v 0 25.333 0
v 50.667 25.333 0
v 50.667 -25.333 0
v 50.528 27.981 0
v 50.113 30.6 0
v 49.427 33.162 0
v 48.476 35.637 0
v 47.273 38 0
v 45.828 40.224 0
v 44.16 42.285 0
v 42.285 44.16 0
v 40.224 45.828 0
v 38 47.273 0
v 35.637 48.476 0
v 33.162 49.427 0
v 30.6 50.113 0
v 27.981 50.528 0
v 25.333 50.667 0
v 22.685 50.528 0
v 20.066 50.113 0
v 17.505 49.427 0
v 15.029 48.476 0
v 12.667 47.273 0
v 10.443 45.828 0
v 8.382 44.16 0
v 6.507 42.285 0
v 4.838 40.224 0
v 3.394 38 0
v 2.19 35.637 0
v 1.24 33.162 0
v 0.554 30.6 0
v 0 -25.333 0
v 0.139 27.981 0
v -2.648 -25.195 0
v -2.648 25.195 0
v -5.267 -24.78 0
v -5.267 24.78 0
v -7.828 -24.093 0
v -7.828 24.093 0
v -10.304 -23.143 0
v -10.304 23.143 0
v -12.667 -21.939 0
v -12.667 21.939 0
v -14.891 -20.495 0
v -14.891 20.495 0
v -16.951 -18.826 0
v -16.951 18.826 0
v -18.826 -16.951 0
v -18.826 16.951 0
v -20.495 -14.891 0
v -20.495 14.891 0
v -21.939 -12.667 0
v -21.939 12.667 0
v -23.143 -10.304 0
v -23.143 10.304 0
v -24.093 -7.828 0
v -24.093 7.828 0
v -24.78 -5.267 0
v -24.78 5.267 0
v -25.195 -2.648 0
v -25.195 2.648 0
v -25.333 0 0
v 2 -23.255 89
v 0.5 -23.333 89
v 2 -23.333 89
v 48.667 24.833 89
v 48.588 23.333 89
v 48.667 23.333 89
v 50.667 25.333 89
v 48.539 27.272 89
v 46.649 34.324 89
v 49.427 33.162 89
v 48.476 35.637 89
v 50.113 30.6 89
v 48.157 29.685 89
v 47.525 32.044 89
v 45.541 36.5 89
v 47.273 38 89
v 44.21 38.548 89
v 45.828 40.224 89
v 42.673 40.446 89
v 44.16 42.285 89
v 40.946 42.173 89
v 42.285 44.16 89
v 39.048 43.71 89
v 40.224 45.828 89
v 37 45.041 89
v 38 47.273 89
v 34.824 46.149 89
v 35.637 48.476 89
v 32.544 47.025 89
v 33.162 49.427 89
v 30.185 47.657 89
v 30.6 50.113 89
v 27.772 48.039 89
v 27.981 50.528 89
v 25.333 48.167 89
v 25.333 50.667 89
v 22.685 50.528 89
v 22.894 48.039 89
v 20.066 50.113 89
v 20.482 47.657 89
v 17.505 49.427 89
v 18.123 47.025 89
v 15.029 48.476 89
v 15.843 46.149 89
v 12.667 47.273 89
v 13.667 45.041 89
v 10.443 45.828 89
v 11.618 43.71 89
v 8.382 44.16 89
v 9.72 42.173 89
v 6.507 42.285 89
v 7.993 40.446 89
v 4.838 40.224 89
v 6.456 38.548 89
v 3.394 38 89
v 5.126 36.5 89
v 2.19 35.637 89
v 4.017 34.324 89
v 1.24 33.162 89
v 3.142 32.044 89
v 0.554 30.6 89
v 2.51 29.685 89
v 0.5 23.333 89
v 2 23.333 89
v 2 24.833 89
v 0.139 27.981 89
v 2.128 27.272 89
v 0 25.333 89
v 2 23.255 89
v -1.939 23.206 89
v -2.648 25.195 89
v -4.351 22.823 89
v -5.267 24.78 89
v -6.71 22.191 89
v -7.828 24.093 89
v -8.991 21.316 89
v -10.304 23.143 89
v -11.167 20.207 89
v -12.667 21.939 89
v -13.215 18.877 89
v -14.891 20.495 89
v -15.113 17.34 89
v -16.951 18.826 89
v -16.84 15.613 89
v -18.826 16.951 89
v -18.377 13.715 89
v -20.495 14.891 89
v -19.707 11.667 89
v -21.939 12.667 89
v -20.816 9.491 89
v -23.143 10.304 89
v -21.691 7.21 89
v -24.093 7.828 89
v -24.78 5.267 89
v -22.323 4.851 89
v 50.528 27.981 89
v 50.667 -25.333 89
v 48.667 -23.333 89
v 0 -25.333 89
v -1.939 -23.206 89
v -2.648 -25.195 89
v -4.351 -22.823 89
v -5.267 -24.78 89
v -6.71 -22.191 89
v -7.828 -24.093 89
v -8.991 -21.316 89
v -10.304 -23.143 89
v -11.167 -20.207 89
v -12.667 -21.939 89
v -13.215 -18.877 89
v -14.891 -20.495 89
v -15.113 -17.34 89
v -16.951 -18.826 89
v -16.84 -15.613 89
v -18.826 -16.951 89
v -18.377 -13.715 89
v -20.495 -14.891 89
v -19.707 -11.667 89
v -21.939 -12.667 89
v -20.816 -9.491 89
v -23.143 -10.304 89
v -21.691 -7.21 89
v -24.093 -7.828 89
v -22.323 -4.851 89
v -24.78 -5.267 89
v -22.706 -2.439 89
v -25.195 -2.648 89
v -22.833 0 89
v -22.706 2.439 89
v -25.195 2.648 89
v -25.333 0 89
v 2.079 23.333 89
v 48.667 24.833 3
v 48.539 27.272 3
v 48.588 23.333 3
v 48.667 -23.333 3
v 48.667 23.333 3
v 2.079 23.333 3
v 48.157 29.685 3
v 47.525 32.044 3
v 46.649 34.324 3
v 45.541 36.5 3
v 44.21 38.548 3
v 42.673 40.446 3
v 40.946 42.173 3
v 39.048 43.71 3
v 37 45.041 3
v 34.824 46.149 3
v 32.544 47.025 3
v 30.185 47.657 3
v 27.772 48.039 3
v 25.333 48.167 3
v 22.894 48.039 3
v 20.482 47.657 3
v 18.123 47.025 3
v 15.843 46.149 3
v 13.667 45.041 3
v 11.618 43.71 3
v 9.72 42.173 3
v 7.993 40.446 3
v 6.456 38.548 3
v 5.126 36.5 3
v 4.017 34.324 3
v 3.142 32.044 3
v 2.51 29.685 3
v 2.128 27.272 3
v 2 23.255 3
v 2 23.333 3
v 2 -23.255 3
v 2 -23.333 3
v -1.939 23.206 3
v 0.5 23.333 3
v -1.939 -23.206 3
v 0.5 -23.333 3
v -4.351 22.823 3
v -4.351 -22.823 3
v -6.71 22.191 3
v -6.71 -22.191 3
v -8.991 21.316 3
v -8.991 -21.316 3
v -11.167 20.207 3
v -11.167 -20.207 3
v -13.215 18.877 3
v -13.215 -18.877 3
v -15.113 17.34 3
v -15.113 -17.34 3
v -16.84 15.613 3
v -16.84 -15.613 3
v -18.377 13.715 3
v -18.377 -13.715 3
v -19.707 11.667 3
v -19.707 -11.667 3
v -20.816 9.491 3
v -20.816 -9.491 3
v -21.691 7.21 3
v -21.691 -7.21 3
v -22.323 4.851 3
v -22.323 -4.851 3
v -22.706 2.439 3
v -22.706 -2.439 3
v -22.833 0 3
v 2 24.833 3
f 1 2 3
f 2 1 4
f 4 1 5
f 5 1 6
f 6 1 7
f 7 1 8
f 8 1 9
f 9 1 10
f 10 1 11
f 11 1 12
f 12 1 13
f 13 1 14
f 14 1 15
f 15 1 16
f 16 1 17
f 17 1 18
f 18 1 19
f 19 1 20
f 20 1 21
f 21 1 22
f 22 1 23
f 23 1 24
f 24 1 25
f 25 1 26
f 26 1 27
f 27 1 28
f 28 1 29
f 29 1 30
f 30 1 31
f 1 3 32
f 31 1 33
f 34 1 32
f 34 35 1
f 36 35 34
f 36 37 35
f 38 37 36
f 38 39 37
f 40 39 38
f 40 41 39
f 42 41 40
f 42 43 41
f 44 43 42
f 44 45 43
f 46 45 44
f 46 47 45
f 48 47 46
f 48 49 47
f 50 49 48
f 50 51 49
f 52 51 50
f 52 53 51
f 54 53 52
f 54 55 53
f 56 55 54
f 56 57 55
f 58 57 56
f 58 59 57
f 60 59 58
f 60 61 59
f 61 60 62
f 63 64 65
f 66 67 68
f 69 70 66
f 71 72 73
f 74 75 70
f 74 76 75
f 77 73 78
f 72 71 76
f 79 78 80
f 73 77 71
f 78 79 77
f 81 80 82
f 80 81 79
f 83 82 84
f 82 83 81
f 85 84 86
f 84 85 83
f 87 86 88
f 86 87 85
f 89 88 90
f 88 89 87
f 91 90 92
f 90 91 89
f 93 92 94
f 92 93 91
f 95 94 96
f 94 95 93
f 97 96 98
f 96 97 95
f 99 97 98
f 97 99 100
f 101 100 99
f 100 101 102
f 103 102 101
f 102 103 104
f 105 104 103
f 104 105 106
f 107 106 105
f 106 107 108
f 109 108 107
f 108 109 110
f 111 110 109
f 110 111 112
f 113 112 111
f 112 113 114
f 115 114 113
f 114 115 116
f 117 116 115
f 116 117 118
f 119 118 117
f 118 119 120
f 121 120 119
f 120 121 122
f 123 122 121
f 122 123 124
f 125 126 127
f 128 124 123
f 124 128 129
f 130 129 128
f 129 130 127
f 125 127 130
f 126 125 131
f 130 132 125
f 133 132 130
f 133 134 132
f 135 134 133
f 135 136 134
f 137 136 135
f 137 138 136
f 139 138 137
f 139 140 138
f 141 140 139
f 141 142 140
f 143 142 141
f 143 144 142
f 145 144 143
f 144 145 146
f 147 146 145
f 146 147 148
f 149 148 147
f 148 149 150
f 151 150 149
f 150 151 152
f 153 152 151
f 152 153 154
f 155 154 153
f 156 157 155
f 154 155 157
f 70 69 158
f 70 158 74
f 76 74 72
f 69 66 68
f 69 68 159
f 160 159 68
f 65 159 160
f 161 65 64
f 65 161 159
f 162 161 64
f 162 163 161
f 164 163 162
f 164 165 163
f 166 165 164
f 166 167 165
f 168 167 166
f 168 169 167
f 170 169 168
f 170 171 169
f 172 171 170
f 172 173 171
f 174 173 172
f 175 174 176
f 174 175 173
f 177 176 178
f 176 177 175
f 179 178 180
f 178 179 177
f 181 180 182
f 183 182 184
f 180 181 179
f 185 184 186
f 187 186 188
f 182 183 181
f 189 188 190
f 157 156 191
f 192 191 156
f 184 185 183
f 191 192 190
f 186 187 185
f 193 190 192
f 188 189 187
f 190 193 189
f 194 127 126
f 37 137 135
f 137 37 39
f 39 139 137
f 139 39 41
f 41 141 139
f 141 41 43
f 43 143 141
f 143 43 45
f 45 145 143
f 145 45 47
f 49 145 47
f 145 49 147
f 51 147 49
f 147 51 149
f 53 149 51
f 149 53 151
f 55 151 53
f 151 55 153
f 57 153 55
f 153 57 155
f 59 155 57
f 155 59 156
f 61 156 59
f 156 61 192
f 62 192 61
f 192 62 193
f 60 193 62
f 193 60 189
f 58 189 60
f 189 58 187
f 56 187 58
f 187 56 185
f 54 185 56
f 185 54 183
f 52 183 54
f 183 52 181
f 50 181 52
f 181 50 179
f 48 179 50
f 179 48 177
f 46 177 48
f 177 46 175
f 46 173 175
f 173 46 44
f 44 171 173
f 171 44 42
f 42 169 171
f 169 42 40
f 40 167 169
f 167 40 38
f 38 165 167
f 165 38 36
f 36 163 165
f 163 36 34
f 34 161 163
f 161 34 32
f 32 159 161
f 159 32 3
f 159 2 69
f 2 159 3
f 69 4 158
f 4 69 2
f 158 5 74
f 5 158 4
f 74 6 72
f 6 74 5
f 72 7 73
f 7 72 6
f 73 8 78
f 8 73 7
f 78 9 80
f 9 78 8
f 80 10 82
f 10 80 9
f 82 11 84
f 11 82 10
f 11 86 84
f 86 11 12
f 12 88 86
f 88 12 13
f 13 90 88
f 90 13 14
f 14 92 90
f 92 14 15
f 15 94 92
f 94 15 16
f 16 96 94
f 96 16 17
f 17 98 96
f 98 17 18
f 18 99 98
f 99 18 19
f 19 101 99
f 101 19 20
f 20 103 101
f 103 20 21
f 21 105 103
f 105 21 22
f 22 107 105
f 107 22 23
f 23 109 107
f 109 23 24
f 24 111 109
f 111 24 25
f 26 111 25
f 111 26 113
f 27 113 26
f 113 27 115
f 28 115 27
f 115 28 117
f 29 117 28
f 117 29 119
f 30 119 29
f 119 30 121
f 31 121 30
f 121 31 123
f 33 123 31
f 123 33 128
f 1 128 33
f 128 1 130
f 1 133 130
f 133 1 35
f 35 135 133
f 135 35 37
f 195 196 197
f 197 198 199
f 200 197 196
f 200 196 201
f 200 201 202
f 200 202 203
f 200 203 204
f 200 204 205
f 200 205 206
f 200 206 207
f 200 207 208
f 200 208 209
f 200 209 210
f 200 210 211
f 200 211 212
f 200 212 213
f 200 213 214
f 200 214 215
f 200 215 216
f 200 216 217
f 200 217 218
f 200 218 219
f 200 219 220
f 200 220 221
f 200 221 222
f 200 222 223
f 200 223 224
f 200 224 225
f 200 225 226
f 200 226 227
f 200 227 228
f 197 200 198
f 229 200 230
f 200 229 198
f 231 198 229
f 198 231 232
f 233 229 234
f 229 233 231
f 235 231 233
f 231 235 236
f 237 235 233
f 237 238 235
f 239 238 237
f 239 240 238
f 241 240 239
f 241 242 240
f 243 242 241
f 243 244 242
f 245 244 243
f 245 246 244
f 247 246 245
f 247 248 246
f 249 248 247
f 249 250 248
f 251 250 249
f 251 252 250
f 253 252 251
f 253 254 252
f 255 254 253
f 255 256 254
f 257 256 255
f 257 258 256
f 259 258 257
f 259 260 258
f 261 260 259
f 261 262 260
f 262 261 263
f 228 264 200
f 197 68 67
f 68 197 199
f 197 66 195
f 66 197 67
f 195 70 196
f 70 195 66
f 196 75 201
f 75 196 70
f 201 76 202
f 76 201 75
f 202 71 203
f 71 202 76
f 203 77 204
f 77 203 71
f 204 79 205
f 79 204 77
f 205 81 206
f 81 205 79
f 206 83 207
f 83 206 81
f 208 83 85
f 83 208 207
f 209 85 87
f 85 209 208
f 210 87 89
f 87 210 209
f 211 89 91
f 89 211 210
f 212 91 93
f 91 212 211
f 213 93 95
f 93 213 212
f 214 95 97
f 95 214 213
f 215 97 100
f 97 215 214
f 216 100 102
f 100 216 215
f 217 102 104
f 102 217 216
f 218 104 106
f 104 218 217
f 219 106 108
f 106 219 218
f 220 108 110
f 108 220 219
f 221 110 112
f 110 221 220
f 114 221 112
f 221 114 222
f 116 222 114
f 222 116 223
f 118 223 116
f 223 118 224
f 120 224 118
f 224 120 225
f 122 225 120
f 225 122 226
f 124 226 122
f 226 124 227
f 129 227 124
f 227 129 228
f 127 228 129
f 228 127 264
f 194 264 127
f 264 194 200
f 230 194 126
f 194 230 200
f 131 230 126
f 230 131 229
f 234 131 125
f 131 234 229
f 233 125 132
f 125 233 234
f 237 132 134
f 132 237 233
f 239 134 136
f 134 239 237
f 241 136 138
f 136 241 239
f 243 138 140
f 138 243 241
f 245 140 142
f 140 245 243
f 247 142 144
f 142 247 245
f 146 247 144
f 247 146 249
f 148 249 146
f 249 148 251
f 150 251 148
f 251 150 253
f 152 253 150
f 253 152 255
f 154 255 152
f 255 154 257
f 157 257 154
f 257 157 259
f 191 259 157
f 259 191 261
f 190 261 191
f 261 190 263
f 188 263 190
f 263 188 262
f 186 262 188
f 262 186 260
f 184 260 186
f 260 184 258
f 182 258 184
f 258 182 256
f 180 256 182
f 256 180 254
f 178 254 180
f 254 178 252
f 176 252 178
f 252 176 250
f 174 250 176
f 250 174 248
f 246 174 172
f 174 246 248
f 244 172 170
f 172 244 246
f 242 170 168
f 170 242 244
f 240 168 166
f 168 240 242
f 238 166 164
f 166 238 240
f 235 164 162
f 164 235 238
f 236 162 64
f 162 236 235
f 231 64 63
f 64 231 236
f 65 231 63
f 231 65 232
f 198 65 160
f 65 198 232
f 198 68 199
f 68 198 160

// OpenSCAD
$fn = 60;

wall_width = 3;

module cup(w, h) {

    module outer_heart(w, h) {
        linear_extrude(height = h) {
            shape_size = w*2/3;
            
            circle(d = shape_size);
            translate([0, -shape_size/2, 0])
                square(shape_size);
            translate([shape_size/2,shape_size/2,0])
                circle(d = shape_size);
        }
    }

    
    module inner_heart(w, h) {
        linear_extrude(height = h + wall_width) {
            shape_size = (w-wall_width*2)*2/3;
            
            translate([wall_width/2/3, 0, 0])
                circle(d = shape_size);
            translate([wall_width/3*2, -shape_size/2, 0])
                square(shape_size);
            translate([shape_size/2+wall_width/3*2,shape_size/2+wall_width/2,0])
                circle(d = shape_size);
        }
    }
    difference() {
        outer_heart(w, h);
        translate([0,0,wall_width]) inner_heart(w,h);
    }
}


cup(w = 76, h = 89); 
